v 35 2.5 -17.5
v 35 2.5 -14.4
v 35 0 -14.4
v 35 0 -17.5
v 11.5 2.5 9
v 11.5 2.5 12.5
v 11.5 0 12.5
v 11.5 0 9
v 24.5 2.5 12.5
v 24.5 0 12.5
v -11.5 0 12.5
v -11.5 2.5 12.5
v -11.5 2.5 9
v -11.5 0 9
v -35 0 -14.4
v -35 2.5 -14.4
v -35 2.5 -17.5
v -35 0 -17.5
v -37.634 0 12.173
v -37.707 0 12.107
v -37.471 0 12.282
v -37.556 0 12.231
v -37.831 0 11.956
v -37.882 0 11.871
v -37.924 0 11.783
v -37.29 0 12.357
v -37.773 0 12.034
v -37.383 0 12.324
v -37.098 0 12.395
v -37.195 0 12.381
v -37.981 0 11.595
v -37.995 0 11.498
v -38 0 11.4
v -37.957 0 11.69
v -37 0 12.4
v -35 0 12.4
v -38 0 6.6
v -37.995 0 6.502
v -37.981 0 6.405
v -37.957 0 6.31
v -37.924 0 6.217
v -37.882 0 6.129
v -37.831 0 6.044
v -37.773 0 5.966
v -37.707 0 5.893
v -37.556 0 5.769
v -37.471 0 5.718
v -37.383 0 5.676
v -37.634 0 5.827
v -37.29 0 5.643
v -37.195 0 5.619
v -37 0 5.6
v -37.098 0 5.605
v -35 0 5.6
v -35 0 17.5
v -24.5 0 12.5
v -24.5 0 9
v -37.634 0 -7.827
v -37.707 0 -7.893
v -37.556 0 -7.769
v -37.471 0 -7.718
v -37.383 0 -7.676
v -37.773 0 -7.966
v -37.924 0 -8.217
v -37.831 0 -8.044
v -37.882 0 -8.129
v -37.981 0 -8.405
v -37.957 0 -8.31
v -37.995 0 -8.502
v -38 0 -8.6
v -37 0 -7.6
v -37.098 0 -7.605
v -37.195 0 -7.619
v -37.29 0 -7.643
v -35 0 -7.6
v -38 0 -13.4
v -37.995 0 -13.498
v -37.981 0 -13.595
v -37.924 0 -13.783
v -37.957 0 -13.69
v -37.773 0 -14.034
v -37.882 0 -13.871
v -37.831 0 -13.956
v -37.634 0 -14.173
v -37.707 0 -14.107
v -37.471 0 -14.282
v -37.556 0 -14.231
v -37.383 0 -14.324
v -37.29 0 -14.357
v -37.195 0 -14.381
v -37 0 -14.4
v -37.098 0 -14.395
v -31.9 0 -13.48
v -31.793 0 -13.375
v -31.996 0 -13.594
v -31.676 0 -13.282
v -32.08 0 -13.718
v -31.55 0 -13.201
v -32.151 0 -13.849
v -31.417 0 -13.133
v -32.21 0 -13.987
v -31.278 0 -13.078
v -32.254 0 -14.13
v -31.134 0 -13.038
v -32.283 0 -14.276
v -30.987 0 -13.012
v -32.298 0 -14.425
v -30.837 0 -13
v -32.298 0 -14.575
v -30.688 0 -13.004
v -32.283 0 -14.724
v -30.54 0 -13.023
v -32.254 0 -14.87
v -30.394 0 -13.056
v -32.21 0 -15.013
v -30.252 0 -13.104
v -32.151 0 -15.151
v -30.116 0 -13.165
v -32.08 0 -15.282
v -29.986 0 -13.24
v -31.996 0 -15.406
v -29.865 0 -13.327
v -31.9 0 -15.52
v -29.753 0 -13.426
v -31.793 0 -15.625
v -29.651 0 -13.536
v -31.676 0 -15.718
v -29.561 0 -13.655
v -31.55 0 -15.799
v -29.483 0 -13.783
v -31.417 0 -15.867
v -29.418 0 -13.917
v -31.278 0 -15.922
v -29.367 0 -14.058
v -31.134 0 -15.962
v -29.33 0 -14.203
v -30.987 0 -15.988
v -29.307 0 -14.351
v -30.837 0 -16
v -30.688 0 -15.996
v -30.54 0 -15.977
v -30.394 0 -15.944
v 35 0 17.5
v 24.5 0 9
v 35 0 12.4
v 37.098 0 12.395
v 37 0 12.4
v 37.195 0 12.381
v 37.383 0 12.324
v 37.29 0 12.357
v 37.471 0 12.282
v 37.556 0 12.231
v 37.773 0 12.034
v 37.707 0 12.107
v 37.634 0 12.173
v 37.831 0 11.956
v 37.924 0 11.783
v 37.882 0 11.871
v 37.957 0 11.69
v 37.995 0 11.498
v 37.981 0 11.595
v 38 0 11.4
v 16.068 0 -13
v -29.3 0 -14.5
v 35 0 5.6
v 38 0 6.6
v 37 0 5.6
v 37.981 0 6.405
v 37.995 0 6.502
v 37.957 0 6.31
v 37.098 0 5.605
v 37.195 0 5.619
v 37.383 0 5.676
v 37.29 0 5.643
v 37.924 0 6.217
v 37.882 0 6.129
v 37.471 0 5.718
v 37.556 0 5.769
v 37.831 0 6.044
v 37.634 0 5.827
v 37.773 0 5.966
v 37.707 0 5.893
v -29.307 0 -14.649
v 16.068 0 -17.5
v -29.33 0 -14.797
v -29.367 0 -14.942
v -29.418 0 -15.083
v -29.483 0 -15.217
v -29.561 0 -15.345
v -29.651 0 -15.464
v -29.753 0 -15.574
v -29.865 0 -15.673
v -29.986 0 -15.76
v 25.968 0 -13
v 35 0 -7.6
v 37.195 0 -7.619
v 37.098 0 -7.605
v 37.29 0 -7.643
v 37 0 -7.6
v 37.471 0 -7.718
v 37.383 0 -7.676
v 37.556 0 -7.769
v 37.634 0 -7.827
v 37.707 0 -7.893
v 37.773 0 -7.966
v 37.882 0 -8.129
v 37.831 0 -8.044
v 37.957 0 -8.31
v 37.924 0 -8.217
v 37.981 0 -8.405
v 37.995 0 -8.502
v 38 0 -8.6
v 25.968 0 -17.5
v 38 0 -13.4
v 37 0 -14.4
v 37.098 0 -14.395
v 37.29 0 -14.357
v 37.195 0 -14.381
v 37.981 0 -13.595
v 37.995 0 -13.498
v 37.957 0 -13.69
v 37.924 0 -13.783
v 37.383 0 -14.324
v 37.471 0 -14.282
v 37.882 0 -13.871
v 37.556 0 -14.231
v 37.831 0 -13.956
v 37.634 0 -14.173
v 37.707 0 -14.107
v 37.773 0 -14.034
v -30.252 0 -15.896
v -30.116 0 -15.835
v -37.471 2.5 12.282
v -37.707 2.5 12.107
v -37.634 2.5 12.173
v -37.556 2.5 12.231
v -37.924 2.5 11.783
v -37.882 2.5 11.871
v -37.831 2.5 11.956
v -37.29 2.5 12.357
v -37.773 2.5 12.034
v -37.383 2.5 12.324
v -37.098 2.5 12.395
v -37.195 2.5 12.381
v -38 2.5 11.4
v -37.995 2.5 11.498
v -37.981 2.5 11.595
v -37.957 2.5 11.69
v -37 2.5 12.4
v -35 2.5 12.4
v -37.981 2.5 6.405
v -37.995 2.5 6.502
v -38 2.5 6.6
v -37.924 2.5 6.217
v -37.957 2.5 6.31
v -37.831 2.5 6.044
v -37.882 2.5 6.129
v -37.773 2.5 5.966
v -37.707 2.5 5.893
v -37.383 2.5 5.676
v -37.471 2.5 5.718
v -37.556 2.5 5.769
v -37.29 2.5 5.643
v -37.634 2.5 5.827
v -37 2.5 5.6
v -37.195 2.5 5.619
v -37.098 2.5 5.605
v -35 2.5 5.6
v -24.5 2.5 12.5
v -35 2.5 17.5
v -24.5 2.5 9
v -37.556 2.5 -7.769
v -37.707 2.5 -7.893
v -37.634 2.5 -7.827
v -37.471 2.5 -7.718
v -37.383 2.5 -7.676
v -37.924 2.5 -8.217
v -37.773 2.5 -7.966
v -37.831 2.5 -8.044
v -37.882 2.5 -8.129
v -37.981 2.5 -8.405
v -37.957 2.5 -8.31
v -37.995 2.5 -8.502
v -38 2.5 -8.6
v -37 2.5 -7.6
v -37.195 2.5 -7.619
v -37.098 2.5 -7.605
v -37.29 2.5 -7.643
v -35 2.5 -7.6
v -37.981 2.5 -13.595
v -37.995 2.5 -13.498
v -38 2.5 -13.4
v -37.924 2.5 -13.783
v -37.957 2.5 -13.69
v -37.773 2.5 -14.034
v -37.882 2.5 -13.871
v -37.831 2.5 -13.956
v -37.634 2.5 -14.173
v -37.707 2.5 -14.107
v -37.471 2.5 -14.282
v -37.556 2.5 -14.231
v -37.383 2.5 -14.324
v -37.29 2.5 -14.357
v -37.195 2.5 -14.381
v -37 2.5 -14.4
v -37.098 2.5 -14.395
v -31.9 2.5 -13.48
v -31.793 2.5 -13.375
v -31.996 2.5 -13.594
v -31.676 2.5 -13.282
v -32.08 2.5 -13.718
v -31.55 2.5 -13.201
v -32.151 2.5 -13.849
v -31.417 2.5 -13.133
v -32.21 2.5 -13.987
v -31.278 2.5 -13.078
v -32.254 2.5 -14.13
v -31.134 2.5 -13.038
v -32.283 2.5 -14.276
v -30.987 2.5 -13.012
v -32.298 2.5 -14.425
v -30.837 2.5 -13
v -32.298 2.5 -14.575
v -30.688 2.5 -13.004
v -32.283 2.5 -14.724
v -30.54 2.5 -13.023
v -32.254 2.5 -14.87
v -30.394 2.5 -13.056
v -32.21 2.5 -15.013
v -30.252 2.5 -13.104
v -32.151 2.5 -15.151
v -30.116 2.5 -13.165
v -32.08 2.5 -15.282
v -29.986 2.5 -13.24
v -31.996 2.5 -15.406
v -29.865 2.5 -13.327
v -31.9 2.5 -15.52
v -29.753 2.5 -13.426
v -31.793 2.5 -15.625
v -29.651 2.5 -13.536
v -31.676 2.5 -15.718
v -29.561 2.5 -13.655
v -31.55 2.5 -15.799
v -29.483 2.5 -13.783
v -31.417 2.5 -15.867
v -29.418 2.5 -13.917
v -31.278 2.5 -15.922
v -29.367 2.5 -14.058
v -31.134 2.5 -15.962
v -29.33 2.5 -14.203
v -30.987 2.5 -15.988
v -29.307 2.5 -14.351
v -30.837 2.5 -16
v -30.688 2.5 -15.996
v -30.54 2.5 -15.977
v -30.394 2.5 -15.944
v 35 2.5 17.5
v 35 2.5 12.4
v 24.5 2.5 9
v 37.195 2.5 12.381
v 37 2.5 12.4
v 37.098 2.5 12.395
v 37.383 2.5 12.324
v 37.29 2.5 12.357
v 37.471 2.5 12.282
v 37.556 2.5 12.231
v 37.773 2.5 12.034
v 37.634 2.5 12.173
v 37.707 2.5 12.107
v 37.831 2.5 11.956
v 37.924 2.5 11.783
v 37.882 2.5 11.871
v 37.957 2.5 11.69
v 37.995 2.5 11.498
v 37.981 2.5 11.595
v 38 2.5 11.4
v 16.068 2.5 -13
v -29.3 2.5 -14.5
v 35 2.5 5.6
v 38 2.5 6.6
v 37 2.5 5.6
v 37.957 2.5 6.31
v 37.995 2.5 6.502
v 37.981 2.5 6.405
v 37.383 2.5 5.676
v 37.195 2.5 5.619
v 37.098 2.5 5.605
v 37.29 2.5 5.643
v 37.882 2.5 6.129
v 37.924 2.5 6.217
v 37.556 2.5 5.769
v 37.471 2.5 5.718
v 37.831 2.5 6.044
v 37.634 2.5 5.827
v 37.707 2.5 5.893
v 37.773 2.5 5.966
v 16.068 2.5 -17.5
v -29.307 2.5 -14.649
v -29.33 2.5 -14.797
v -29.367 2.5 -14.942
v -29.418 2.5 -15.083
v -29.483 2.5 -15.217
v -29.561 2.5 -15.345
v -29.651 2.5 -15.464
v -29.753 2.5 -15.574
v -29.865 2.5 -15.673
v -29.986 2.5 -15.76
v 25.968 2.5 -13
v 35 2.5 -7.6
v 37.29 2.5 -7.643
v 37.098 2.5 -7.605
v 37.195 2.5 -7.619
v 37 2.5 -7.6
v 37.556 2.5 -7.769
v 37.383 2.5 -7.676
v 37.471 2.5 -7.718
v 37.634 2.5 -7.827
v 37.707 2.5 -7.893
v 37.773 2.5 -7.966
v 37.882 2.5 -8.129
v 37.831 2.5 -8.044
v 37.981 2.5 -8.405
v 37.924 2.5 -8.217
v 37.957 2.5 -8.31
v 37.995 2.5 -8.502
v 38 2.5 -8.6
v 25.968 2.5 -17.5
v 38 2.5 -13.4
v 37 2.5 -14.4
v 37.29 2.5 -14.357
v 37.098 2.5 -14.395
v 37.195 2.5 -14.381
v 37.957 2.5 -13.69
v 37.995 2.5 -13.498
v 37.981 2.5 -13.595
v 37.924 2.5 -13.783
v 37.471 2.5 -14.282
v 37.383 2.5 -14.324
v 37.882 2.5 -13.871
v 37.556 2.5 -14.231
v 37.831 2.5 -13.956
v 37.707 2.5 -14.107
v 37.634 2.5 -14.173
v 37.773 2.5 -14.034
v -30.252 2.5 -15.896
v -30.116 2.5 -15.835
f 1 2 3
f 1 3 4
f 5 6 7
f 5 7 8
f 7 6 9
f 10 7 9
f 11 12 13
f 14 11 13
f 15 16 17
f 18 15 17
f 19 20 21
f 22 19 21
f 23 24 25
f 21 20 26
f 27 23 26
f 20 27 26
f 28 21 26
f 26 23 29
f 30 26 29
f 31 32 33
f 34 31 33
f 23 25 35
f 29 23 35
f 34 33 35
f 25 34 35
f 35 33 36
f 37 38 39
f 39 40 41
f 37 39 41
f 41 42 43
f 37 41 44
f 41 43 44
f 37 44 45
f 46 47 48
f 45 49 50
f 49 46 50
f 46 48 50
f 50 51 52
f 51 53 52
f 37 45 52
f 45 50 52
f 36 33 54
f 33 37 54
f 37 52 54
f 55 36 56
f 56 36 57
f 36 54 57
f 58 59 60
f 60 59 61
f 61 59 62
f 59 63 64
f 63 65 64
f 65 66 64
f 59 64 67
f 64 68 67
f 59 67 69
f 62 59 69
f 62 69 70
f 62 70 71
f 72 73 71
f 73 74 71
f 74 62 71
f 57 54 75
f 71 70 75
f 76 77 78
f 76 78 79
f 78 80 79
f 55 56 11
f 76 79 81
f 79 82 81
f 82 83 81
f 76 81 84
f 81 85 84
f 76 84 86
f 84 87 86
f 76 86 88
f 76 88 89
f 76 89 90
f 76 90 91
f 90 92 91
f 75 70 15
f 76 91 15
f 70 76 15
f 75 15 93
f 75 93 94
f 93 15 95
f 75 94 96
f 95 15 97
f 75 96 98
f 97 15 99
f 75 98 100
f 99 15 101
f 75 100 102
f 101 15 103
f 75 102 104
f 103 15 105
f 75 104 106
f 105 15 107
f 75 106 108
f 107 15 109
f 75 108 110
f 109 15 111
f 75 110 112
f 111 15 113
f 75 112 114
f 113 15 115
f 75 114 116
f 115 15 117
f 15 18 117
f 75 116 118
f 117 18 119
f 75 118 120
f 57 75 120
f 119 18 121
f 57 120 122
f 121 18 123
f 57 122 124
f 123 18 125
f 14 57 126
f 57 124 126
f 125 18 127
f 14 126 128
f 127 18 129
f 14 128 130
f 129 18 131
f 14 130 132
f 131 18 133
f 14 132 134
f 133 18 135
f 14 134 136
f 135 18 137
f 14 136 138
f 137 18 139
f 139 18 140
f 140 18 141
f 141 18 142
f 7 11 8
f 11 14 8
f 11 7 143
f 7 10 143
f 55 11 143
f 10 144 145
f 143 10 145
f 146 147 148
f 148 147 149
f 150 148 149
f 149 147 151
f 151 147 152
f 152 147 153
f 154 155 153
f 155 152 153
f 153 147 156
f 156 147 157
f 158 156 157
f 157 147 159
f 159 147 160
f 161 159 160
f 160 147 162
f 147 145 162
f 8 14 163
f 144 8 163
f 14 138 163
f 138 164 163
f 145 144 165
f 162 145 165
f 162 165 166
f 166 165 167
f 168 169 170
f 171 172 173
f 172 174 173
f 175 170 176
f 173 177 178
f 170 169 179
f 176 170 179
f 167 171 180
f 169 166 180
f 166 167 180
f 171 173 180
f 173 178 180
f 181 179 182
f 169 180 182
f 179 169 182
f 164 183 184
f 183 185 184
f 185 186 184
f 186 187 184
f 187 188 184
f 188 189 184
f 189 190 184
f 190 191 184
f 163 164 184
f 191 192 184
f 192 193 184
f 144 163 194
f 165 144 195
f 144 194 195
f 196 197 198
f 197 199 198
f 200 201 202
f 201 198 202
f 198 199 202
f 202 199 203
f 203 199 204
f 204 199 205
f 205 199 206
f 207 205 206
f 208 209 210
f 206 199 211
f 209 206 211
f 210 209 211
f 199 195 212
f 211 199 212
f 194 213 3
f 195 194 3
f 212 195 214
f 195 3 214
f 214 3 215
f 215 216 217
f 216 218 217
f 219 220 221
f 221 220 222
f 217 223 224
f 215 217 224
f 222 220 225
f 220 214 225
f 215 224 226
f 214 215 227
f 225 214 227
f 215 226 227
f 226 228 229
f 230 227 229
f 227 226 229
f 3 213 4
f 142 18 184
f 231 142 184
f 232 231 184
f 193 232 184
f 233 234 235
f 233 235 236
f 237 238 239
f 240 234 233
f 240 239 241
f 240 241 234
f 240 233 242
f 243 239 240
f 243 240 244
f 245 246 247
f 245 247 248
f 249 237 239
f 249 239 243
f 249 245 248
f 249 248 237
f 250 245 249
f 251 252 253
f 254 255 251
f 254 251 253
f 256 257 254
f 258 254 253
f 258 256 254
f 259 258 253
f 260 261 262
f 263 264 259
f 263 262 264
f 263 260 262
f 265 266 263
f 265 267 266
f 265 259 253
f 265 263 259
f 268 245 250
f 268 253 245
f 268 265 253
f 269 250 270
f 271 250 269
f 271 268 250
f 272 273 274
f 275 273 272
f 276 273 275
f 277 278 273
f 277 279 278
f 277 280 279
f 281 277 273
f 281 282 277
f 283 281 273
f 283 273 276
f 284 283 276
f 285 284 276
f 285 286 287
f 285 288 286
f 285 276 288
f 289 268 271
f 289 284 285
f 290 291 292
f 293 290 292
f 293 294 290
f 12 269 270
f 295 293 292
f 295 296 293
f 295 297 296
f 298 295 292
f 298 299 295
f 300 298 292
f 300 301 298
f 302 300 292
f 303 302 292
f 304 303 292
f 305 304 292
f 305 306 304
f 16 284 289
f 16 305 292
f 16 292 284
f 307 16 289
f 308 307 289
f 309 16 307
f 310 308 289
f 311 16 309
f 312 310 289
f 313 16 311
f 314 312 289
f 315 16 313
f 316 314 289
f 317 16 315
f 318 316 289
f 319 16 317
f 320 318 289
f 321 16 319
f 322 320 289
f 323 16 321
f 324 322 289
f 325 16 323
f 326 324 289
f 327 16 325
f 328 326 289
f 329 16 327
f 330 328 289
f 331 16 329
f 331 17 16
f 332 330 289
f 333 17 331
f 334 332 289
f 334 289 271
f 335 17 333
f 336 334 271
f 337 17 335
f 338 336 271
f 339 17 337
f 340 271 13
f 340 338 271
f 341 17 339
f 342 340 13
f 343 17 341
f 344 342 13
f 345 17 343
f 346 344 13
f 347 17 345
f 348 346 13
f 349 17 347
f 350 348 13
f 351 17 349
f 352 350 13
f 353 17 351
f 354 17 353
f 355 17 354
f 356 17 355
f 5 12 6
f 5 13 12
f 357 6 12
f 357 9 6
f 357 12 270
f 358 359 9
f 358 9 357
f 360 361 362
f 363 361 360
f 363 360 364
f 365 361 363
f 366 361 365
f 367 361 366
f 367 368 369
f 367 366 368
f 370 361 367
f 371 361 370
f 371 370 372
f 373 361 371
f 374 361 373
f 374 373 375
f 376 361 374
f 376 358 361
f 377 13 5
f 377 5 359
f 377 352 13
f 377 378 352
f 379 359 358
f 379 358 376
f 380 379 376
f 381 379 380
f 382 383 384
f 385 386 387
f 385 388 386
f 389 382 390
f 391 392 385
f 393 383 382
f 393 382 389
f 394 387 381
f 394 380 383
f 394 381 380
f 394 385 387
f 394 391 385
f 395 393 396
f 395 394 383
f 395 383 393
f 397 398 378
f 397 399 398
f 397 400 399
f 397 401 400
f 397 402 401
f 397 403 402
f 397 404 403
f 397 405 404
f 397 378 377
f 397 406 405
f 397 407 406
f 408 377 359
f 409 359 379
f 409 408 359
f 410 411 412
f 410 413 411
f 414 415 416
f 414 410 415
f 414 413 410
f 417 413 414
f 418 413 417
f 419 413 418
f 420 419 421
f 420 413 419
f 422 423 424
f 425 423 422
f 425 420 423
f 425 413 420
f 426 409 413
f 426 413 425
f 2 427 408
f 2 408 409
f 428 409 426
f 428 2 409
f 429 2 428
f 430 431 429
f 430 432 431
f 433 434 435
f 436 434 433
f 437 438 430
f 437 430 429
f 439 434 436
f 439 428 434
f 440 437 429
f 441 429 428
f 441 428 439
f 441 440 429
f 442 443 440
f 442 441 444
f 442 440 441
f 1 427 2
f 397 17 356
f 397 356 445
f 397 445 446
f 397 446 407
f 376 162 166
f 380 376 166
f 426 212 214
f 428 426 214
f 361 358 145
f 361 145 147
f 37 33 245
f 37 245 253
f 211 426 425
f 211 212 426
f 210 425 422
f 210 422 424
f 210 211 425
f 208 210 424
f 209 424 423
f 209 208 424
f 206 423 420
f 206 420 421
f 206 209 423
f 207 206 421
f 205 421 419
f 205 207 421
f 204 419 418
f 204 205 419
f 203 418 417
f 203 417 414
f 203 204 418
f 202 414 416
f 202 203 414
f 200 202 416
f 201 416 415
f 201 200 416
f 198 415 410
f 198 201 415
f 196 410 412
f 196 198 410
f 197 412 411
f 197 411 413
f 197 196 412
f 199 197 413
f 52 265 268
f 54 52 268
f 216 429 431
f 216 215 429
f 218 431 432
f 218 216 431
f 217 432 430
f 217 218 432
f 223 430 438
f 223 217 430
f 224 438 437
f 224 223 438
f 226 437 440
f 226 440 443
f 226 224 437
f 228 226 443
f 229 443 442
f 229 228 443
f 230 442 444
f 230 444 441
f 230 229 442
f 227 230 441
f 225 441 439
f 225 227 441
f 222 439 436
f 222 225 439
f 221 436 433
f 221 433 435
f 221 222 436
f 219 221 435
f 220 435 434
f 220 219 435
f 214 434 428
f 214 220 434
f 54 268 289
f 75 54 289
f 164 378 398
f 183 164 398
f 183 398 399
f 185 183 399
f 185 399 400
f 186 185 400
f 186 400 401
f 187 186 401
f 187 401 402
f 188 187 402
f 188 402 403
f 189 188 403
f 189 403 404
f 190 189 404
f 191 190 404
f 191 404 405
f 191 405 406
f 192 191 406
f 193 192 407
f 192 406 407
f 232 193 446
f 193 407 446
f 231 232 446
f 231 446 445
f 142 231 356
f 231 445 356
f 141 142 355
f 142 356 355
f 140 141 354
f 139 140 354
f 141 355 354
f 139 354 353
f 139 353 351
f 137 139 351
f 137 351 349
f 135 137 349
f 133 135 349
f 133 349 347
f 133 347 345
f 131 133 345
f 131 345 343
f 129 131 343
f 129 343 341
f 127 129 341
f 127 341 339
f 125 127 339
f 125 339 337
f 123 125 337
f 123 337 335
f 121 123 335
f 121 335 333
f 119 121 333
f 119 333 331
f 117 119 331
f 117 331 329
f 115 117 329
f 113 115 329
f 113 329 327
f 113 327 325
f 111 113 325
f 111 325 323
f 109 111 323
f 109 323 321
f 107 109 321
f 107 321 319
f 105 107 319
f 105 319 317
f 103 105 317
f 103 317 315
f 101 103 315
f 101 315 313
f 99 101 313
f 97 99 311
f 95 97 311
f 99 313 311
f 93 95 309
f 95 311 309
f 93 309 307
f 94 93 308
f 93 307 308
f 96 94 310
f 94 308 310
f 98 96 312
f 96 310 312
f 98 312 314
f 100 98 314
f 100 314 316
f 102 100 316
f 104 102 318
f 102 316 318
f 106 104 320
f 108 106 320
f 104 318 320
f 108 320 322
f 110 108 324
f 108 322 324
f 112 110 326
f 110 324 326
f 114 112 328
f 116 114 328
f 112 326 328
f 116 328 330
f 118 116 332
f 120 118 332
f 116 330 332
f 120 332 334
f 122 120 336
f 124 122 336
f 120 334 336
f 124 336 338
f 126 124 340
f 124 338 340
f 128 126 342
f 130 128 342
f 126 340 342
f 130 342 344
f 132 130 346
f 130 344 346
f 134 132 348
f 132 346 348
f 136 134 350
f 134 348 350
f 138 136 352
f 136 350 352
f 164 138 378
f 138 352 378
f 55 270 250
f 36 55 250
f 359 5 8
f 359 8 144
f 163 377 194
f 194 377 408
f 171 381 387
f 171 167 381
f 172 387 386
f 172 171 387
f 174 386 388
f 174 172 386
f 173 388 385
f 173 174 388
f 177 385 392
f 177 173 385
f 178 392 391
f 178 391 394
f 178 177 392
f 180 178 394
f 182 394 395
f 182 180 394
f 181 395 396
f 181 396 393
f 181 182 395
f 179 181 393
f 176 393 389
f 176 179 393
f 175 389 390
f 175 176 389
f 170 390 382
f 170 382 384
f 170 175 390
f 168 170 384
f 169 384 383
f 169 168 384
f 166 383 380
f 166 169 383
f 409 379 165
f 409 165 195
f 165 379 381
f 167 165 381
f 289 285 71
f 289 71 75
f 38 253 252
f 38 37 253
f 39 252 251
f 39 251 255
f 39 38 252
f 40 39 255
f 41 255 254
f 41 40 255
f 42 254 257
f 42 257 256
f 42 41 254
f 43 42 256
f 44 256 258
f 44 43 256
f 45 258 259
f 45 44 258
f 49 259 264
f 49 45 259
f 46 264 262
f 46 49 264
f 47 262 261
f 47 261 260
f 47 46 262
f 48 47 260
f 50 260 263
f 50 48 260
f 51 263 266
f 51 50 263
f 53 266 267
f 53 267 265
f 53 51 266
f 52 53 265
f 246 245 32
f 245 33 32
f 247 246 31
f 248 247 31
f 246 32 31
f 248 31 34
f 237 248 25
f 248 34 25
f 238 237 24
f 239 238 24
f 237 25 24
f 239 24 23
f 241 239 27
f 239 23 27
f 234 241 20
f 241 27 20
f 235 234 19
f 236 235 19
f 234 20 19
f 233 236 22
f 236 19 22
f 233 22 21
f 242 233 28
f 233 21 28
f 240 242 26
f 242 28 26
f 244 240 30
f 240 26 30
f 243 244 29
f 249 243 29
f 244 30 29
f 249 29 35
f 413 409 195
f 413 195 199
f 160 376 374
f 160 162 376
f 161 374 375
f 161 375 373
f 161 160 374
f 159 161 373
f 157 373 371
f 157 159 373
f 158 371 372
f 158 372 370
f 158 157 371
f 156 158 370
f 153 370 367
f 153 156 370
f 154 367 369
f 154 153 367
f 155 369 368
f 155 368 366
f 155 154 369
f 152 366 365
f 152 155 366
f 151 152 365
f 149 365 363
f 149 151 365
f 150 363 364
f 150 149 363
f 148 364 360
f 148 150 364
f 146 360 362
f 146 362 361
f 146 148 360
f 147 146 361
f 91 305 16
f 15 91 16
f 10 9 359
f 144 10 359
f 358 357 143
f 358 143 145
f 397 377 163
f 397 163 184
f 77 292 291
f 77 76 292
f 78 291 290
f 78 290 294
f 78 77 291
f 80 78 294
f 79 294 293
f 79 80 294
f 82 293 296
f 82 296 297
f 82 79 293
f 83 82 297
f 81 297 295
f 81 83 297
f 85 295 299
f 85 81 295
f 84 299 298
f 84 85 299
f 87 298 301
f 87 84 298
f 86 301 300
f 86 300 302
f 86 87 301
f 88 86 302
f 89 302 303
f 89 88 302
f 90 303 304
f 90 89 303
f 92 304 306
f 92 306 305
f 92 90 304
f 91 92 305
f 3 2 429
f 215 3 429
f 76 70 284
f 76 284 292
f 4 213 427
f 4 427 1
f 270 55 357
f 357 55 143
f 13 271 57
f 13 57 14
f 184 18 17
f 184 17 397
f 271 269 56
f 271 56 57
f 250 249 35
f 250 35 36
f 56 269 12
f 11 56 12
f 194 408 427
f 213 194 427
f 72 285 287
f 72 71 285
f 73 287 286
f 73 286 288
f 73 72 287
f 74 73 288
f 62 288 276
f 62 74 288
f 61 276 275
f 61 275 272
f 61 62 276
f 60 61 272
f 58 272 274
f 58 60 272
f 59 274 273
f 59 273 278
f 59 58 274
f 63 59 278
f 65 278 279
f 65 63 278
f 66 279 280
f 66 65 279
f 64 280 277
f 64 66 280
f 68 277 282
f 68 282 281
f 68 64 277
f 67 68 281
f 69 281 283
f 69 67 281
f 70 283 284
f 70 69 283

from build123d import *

# Parameters (mm, degrees)
SKETCH_1_W          = 76
SKETCH_1_H          = 35
EXTRUDE_1_DEPTH     = 2.5
SKETCH_2_W          = 13
SKETCH_2_H          = 3.5
CUT_EXTRUDE_1_DEPTH = 3.5
SKETCH_3_W          = 3
SKETCH_3_H          = 5.1
SKETCH_3_H_2        = 3.1
SKETCH_3_H_3        = 13.2
CUT_EXTRUDE_2_DEPTH = 3.5
FILLET_1_R          = 1
SKETCH_4_R          = 1.5
SKETCH_4_W          = 9.9
SKETCH_4_H          = 4.5
CUT_EXTRUDE_3_DEPTH = 3.5


with BuildPart() as part:
    # 草图1 → 凸台-拉伸1 (new body)
    with BuildSketch(Plane(origin=(0, 0, 0), x_dir=(1, 0, 0), z_dir=(0, 1, 0))):
        Rectangle(SKETCH_1_W, SKETCH_1_H)
    extrude(amount=EXTRUDE_1_DEPTH)

    # 草图2 → 切除-拉伸1 (cut, through all)
    with BuildSketch(Plane(origin=(0, 2.5, 0), x_dir=(1, 0, 0), z_dir=(0, 1, 0))):
        with Locations((-18, -10.75)):
            Rectangle(SKETCH_2_W, SKETCH_2_H)
        with Locations((18, -10.75)):
            Rectangle(SKETCH_2_W, SKETCH_2_H)
    extrude(amount=-CUT_EXTRUDE_1_DEPTH, mode=Mode.SUBTRACT)

    # 草图3 → 切除-拉伸2 (cut, through all)
    with BuildSketch(Plane(origin=(0, 2.5, 0), x_dir=(1, 0, 0), z_dir=(0, 1, 0))):
        with Locations((-36.5, -14.95)):
            Rectangle(SKETCH_3_W, SKETCH_3_H)
        with Locations((-36.5, 15.95)):
            Rectangle(SKETCH_3_W, SKETCH_3_H_2)
        with Locations((-36.5, 1)):
            Rectangle(SKETCH_3_W, SKETCH_3_H_3)
        with Locations((36.5, -14.95)):
            Rectangle(SKETCH_3_W, SKETCH_3_H)
        with Locations((36.5, 1)):
            Rectangle(SKETCH_3_W, SKETCH_3_H_3)
        with Locations((36.5, 15.95)):
            Rectangle(SKETCH_3_W, SKETCH_3_H_2)
    extrude(amount=-CUT_EXTRUDE_2_DEPTH, mode=Mode.SUBTRACT)

    # 圆角1
    fillet_1_edges = [part.edges().sort_by_distance(p)[0] for p in [
        (38, 1.25, -7.6),
        (38, 1.25, 5.6),
        (38, 1.25, -14.4),
        (-38, 1.25, 12.4),
        (-38, 1.25, -14.4),
        (-38, 1.25, 5.6),
        (-38, 1.25, -7.6),
        (38, 1.25, 12.4),
    ]]
    fillet(fillet_1_edges, radius=FILLET_1_R)

    # 草图4 → 切除-拉伸3 (cut, through all)
    with BuildSketch(Plane(origin=(0, 2.5, 0), x_dir=(1, 0, 0), z_dir=(0, 1, 0))):
        with Locations((-30.8, 14.5)):
            Circle(SKETCH_4_R)
        with Locations((21.018135054, 15.25)):
            Rectangle(SKETCH_4_W, SKETCH_4_H)
    extrude(amount=-CUT_EXTRUDE_3_DEPTH, mode=Mode.SUBTRACT)


solid = part.part
